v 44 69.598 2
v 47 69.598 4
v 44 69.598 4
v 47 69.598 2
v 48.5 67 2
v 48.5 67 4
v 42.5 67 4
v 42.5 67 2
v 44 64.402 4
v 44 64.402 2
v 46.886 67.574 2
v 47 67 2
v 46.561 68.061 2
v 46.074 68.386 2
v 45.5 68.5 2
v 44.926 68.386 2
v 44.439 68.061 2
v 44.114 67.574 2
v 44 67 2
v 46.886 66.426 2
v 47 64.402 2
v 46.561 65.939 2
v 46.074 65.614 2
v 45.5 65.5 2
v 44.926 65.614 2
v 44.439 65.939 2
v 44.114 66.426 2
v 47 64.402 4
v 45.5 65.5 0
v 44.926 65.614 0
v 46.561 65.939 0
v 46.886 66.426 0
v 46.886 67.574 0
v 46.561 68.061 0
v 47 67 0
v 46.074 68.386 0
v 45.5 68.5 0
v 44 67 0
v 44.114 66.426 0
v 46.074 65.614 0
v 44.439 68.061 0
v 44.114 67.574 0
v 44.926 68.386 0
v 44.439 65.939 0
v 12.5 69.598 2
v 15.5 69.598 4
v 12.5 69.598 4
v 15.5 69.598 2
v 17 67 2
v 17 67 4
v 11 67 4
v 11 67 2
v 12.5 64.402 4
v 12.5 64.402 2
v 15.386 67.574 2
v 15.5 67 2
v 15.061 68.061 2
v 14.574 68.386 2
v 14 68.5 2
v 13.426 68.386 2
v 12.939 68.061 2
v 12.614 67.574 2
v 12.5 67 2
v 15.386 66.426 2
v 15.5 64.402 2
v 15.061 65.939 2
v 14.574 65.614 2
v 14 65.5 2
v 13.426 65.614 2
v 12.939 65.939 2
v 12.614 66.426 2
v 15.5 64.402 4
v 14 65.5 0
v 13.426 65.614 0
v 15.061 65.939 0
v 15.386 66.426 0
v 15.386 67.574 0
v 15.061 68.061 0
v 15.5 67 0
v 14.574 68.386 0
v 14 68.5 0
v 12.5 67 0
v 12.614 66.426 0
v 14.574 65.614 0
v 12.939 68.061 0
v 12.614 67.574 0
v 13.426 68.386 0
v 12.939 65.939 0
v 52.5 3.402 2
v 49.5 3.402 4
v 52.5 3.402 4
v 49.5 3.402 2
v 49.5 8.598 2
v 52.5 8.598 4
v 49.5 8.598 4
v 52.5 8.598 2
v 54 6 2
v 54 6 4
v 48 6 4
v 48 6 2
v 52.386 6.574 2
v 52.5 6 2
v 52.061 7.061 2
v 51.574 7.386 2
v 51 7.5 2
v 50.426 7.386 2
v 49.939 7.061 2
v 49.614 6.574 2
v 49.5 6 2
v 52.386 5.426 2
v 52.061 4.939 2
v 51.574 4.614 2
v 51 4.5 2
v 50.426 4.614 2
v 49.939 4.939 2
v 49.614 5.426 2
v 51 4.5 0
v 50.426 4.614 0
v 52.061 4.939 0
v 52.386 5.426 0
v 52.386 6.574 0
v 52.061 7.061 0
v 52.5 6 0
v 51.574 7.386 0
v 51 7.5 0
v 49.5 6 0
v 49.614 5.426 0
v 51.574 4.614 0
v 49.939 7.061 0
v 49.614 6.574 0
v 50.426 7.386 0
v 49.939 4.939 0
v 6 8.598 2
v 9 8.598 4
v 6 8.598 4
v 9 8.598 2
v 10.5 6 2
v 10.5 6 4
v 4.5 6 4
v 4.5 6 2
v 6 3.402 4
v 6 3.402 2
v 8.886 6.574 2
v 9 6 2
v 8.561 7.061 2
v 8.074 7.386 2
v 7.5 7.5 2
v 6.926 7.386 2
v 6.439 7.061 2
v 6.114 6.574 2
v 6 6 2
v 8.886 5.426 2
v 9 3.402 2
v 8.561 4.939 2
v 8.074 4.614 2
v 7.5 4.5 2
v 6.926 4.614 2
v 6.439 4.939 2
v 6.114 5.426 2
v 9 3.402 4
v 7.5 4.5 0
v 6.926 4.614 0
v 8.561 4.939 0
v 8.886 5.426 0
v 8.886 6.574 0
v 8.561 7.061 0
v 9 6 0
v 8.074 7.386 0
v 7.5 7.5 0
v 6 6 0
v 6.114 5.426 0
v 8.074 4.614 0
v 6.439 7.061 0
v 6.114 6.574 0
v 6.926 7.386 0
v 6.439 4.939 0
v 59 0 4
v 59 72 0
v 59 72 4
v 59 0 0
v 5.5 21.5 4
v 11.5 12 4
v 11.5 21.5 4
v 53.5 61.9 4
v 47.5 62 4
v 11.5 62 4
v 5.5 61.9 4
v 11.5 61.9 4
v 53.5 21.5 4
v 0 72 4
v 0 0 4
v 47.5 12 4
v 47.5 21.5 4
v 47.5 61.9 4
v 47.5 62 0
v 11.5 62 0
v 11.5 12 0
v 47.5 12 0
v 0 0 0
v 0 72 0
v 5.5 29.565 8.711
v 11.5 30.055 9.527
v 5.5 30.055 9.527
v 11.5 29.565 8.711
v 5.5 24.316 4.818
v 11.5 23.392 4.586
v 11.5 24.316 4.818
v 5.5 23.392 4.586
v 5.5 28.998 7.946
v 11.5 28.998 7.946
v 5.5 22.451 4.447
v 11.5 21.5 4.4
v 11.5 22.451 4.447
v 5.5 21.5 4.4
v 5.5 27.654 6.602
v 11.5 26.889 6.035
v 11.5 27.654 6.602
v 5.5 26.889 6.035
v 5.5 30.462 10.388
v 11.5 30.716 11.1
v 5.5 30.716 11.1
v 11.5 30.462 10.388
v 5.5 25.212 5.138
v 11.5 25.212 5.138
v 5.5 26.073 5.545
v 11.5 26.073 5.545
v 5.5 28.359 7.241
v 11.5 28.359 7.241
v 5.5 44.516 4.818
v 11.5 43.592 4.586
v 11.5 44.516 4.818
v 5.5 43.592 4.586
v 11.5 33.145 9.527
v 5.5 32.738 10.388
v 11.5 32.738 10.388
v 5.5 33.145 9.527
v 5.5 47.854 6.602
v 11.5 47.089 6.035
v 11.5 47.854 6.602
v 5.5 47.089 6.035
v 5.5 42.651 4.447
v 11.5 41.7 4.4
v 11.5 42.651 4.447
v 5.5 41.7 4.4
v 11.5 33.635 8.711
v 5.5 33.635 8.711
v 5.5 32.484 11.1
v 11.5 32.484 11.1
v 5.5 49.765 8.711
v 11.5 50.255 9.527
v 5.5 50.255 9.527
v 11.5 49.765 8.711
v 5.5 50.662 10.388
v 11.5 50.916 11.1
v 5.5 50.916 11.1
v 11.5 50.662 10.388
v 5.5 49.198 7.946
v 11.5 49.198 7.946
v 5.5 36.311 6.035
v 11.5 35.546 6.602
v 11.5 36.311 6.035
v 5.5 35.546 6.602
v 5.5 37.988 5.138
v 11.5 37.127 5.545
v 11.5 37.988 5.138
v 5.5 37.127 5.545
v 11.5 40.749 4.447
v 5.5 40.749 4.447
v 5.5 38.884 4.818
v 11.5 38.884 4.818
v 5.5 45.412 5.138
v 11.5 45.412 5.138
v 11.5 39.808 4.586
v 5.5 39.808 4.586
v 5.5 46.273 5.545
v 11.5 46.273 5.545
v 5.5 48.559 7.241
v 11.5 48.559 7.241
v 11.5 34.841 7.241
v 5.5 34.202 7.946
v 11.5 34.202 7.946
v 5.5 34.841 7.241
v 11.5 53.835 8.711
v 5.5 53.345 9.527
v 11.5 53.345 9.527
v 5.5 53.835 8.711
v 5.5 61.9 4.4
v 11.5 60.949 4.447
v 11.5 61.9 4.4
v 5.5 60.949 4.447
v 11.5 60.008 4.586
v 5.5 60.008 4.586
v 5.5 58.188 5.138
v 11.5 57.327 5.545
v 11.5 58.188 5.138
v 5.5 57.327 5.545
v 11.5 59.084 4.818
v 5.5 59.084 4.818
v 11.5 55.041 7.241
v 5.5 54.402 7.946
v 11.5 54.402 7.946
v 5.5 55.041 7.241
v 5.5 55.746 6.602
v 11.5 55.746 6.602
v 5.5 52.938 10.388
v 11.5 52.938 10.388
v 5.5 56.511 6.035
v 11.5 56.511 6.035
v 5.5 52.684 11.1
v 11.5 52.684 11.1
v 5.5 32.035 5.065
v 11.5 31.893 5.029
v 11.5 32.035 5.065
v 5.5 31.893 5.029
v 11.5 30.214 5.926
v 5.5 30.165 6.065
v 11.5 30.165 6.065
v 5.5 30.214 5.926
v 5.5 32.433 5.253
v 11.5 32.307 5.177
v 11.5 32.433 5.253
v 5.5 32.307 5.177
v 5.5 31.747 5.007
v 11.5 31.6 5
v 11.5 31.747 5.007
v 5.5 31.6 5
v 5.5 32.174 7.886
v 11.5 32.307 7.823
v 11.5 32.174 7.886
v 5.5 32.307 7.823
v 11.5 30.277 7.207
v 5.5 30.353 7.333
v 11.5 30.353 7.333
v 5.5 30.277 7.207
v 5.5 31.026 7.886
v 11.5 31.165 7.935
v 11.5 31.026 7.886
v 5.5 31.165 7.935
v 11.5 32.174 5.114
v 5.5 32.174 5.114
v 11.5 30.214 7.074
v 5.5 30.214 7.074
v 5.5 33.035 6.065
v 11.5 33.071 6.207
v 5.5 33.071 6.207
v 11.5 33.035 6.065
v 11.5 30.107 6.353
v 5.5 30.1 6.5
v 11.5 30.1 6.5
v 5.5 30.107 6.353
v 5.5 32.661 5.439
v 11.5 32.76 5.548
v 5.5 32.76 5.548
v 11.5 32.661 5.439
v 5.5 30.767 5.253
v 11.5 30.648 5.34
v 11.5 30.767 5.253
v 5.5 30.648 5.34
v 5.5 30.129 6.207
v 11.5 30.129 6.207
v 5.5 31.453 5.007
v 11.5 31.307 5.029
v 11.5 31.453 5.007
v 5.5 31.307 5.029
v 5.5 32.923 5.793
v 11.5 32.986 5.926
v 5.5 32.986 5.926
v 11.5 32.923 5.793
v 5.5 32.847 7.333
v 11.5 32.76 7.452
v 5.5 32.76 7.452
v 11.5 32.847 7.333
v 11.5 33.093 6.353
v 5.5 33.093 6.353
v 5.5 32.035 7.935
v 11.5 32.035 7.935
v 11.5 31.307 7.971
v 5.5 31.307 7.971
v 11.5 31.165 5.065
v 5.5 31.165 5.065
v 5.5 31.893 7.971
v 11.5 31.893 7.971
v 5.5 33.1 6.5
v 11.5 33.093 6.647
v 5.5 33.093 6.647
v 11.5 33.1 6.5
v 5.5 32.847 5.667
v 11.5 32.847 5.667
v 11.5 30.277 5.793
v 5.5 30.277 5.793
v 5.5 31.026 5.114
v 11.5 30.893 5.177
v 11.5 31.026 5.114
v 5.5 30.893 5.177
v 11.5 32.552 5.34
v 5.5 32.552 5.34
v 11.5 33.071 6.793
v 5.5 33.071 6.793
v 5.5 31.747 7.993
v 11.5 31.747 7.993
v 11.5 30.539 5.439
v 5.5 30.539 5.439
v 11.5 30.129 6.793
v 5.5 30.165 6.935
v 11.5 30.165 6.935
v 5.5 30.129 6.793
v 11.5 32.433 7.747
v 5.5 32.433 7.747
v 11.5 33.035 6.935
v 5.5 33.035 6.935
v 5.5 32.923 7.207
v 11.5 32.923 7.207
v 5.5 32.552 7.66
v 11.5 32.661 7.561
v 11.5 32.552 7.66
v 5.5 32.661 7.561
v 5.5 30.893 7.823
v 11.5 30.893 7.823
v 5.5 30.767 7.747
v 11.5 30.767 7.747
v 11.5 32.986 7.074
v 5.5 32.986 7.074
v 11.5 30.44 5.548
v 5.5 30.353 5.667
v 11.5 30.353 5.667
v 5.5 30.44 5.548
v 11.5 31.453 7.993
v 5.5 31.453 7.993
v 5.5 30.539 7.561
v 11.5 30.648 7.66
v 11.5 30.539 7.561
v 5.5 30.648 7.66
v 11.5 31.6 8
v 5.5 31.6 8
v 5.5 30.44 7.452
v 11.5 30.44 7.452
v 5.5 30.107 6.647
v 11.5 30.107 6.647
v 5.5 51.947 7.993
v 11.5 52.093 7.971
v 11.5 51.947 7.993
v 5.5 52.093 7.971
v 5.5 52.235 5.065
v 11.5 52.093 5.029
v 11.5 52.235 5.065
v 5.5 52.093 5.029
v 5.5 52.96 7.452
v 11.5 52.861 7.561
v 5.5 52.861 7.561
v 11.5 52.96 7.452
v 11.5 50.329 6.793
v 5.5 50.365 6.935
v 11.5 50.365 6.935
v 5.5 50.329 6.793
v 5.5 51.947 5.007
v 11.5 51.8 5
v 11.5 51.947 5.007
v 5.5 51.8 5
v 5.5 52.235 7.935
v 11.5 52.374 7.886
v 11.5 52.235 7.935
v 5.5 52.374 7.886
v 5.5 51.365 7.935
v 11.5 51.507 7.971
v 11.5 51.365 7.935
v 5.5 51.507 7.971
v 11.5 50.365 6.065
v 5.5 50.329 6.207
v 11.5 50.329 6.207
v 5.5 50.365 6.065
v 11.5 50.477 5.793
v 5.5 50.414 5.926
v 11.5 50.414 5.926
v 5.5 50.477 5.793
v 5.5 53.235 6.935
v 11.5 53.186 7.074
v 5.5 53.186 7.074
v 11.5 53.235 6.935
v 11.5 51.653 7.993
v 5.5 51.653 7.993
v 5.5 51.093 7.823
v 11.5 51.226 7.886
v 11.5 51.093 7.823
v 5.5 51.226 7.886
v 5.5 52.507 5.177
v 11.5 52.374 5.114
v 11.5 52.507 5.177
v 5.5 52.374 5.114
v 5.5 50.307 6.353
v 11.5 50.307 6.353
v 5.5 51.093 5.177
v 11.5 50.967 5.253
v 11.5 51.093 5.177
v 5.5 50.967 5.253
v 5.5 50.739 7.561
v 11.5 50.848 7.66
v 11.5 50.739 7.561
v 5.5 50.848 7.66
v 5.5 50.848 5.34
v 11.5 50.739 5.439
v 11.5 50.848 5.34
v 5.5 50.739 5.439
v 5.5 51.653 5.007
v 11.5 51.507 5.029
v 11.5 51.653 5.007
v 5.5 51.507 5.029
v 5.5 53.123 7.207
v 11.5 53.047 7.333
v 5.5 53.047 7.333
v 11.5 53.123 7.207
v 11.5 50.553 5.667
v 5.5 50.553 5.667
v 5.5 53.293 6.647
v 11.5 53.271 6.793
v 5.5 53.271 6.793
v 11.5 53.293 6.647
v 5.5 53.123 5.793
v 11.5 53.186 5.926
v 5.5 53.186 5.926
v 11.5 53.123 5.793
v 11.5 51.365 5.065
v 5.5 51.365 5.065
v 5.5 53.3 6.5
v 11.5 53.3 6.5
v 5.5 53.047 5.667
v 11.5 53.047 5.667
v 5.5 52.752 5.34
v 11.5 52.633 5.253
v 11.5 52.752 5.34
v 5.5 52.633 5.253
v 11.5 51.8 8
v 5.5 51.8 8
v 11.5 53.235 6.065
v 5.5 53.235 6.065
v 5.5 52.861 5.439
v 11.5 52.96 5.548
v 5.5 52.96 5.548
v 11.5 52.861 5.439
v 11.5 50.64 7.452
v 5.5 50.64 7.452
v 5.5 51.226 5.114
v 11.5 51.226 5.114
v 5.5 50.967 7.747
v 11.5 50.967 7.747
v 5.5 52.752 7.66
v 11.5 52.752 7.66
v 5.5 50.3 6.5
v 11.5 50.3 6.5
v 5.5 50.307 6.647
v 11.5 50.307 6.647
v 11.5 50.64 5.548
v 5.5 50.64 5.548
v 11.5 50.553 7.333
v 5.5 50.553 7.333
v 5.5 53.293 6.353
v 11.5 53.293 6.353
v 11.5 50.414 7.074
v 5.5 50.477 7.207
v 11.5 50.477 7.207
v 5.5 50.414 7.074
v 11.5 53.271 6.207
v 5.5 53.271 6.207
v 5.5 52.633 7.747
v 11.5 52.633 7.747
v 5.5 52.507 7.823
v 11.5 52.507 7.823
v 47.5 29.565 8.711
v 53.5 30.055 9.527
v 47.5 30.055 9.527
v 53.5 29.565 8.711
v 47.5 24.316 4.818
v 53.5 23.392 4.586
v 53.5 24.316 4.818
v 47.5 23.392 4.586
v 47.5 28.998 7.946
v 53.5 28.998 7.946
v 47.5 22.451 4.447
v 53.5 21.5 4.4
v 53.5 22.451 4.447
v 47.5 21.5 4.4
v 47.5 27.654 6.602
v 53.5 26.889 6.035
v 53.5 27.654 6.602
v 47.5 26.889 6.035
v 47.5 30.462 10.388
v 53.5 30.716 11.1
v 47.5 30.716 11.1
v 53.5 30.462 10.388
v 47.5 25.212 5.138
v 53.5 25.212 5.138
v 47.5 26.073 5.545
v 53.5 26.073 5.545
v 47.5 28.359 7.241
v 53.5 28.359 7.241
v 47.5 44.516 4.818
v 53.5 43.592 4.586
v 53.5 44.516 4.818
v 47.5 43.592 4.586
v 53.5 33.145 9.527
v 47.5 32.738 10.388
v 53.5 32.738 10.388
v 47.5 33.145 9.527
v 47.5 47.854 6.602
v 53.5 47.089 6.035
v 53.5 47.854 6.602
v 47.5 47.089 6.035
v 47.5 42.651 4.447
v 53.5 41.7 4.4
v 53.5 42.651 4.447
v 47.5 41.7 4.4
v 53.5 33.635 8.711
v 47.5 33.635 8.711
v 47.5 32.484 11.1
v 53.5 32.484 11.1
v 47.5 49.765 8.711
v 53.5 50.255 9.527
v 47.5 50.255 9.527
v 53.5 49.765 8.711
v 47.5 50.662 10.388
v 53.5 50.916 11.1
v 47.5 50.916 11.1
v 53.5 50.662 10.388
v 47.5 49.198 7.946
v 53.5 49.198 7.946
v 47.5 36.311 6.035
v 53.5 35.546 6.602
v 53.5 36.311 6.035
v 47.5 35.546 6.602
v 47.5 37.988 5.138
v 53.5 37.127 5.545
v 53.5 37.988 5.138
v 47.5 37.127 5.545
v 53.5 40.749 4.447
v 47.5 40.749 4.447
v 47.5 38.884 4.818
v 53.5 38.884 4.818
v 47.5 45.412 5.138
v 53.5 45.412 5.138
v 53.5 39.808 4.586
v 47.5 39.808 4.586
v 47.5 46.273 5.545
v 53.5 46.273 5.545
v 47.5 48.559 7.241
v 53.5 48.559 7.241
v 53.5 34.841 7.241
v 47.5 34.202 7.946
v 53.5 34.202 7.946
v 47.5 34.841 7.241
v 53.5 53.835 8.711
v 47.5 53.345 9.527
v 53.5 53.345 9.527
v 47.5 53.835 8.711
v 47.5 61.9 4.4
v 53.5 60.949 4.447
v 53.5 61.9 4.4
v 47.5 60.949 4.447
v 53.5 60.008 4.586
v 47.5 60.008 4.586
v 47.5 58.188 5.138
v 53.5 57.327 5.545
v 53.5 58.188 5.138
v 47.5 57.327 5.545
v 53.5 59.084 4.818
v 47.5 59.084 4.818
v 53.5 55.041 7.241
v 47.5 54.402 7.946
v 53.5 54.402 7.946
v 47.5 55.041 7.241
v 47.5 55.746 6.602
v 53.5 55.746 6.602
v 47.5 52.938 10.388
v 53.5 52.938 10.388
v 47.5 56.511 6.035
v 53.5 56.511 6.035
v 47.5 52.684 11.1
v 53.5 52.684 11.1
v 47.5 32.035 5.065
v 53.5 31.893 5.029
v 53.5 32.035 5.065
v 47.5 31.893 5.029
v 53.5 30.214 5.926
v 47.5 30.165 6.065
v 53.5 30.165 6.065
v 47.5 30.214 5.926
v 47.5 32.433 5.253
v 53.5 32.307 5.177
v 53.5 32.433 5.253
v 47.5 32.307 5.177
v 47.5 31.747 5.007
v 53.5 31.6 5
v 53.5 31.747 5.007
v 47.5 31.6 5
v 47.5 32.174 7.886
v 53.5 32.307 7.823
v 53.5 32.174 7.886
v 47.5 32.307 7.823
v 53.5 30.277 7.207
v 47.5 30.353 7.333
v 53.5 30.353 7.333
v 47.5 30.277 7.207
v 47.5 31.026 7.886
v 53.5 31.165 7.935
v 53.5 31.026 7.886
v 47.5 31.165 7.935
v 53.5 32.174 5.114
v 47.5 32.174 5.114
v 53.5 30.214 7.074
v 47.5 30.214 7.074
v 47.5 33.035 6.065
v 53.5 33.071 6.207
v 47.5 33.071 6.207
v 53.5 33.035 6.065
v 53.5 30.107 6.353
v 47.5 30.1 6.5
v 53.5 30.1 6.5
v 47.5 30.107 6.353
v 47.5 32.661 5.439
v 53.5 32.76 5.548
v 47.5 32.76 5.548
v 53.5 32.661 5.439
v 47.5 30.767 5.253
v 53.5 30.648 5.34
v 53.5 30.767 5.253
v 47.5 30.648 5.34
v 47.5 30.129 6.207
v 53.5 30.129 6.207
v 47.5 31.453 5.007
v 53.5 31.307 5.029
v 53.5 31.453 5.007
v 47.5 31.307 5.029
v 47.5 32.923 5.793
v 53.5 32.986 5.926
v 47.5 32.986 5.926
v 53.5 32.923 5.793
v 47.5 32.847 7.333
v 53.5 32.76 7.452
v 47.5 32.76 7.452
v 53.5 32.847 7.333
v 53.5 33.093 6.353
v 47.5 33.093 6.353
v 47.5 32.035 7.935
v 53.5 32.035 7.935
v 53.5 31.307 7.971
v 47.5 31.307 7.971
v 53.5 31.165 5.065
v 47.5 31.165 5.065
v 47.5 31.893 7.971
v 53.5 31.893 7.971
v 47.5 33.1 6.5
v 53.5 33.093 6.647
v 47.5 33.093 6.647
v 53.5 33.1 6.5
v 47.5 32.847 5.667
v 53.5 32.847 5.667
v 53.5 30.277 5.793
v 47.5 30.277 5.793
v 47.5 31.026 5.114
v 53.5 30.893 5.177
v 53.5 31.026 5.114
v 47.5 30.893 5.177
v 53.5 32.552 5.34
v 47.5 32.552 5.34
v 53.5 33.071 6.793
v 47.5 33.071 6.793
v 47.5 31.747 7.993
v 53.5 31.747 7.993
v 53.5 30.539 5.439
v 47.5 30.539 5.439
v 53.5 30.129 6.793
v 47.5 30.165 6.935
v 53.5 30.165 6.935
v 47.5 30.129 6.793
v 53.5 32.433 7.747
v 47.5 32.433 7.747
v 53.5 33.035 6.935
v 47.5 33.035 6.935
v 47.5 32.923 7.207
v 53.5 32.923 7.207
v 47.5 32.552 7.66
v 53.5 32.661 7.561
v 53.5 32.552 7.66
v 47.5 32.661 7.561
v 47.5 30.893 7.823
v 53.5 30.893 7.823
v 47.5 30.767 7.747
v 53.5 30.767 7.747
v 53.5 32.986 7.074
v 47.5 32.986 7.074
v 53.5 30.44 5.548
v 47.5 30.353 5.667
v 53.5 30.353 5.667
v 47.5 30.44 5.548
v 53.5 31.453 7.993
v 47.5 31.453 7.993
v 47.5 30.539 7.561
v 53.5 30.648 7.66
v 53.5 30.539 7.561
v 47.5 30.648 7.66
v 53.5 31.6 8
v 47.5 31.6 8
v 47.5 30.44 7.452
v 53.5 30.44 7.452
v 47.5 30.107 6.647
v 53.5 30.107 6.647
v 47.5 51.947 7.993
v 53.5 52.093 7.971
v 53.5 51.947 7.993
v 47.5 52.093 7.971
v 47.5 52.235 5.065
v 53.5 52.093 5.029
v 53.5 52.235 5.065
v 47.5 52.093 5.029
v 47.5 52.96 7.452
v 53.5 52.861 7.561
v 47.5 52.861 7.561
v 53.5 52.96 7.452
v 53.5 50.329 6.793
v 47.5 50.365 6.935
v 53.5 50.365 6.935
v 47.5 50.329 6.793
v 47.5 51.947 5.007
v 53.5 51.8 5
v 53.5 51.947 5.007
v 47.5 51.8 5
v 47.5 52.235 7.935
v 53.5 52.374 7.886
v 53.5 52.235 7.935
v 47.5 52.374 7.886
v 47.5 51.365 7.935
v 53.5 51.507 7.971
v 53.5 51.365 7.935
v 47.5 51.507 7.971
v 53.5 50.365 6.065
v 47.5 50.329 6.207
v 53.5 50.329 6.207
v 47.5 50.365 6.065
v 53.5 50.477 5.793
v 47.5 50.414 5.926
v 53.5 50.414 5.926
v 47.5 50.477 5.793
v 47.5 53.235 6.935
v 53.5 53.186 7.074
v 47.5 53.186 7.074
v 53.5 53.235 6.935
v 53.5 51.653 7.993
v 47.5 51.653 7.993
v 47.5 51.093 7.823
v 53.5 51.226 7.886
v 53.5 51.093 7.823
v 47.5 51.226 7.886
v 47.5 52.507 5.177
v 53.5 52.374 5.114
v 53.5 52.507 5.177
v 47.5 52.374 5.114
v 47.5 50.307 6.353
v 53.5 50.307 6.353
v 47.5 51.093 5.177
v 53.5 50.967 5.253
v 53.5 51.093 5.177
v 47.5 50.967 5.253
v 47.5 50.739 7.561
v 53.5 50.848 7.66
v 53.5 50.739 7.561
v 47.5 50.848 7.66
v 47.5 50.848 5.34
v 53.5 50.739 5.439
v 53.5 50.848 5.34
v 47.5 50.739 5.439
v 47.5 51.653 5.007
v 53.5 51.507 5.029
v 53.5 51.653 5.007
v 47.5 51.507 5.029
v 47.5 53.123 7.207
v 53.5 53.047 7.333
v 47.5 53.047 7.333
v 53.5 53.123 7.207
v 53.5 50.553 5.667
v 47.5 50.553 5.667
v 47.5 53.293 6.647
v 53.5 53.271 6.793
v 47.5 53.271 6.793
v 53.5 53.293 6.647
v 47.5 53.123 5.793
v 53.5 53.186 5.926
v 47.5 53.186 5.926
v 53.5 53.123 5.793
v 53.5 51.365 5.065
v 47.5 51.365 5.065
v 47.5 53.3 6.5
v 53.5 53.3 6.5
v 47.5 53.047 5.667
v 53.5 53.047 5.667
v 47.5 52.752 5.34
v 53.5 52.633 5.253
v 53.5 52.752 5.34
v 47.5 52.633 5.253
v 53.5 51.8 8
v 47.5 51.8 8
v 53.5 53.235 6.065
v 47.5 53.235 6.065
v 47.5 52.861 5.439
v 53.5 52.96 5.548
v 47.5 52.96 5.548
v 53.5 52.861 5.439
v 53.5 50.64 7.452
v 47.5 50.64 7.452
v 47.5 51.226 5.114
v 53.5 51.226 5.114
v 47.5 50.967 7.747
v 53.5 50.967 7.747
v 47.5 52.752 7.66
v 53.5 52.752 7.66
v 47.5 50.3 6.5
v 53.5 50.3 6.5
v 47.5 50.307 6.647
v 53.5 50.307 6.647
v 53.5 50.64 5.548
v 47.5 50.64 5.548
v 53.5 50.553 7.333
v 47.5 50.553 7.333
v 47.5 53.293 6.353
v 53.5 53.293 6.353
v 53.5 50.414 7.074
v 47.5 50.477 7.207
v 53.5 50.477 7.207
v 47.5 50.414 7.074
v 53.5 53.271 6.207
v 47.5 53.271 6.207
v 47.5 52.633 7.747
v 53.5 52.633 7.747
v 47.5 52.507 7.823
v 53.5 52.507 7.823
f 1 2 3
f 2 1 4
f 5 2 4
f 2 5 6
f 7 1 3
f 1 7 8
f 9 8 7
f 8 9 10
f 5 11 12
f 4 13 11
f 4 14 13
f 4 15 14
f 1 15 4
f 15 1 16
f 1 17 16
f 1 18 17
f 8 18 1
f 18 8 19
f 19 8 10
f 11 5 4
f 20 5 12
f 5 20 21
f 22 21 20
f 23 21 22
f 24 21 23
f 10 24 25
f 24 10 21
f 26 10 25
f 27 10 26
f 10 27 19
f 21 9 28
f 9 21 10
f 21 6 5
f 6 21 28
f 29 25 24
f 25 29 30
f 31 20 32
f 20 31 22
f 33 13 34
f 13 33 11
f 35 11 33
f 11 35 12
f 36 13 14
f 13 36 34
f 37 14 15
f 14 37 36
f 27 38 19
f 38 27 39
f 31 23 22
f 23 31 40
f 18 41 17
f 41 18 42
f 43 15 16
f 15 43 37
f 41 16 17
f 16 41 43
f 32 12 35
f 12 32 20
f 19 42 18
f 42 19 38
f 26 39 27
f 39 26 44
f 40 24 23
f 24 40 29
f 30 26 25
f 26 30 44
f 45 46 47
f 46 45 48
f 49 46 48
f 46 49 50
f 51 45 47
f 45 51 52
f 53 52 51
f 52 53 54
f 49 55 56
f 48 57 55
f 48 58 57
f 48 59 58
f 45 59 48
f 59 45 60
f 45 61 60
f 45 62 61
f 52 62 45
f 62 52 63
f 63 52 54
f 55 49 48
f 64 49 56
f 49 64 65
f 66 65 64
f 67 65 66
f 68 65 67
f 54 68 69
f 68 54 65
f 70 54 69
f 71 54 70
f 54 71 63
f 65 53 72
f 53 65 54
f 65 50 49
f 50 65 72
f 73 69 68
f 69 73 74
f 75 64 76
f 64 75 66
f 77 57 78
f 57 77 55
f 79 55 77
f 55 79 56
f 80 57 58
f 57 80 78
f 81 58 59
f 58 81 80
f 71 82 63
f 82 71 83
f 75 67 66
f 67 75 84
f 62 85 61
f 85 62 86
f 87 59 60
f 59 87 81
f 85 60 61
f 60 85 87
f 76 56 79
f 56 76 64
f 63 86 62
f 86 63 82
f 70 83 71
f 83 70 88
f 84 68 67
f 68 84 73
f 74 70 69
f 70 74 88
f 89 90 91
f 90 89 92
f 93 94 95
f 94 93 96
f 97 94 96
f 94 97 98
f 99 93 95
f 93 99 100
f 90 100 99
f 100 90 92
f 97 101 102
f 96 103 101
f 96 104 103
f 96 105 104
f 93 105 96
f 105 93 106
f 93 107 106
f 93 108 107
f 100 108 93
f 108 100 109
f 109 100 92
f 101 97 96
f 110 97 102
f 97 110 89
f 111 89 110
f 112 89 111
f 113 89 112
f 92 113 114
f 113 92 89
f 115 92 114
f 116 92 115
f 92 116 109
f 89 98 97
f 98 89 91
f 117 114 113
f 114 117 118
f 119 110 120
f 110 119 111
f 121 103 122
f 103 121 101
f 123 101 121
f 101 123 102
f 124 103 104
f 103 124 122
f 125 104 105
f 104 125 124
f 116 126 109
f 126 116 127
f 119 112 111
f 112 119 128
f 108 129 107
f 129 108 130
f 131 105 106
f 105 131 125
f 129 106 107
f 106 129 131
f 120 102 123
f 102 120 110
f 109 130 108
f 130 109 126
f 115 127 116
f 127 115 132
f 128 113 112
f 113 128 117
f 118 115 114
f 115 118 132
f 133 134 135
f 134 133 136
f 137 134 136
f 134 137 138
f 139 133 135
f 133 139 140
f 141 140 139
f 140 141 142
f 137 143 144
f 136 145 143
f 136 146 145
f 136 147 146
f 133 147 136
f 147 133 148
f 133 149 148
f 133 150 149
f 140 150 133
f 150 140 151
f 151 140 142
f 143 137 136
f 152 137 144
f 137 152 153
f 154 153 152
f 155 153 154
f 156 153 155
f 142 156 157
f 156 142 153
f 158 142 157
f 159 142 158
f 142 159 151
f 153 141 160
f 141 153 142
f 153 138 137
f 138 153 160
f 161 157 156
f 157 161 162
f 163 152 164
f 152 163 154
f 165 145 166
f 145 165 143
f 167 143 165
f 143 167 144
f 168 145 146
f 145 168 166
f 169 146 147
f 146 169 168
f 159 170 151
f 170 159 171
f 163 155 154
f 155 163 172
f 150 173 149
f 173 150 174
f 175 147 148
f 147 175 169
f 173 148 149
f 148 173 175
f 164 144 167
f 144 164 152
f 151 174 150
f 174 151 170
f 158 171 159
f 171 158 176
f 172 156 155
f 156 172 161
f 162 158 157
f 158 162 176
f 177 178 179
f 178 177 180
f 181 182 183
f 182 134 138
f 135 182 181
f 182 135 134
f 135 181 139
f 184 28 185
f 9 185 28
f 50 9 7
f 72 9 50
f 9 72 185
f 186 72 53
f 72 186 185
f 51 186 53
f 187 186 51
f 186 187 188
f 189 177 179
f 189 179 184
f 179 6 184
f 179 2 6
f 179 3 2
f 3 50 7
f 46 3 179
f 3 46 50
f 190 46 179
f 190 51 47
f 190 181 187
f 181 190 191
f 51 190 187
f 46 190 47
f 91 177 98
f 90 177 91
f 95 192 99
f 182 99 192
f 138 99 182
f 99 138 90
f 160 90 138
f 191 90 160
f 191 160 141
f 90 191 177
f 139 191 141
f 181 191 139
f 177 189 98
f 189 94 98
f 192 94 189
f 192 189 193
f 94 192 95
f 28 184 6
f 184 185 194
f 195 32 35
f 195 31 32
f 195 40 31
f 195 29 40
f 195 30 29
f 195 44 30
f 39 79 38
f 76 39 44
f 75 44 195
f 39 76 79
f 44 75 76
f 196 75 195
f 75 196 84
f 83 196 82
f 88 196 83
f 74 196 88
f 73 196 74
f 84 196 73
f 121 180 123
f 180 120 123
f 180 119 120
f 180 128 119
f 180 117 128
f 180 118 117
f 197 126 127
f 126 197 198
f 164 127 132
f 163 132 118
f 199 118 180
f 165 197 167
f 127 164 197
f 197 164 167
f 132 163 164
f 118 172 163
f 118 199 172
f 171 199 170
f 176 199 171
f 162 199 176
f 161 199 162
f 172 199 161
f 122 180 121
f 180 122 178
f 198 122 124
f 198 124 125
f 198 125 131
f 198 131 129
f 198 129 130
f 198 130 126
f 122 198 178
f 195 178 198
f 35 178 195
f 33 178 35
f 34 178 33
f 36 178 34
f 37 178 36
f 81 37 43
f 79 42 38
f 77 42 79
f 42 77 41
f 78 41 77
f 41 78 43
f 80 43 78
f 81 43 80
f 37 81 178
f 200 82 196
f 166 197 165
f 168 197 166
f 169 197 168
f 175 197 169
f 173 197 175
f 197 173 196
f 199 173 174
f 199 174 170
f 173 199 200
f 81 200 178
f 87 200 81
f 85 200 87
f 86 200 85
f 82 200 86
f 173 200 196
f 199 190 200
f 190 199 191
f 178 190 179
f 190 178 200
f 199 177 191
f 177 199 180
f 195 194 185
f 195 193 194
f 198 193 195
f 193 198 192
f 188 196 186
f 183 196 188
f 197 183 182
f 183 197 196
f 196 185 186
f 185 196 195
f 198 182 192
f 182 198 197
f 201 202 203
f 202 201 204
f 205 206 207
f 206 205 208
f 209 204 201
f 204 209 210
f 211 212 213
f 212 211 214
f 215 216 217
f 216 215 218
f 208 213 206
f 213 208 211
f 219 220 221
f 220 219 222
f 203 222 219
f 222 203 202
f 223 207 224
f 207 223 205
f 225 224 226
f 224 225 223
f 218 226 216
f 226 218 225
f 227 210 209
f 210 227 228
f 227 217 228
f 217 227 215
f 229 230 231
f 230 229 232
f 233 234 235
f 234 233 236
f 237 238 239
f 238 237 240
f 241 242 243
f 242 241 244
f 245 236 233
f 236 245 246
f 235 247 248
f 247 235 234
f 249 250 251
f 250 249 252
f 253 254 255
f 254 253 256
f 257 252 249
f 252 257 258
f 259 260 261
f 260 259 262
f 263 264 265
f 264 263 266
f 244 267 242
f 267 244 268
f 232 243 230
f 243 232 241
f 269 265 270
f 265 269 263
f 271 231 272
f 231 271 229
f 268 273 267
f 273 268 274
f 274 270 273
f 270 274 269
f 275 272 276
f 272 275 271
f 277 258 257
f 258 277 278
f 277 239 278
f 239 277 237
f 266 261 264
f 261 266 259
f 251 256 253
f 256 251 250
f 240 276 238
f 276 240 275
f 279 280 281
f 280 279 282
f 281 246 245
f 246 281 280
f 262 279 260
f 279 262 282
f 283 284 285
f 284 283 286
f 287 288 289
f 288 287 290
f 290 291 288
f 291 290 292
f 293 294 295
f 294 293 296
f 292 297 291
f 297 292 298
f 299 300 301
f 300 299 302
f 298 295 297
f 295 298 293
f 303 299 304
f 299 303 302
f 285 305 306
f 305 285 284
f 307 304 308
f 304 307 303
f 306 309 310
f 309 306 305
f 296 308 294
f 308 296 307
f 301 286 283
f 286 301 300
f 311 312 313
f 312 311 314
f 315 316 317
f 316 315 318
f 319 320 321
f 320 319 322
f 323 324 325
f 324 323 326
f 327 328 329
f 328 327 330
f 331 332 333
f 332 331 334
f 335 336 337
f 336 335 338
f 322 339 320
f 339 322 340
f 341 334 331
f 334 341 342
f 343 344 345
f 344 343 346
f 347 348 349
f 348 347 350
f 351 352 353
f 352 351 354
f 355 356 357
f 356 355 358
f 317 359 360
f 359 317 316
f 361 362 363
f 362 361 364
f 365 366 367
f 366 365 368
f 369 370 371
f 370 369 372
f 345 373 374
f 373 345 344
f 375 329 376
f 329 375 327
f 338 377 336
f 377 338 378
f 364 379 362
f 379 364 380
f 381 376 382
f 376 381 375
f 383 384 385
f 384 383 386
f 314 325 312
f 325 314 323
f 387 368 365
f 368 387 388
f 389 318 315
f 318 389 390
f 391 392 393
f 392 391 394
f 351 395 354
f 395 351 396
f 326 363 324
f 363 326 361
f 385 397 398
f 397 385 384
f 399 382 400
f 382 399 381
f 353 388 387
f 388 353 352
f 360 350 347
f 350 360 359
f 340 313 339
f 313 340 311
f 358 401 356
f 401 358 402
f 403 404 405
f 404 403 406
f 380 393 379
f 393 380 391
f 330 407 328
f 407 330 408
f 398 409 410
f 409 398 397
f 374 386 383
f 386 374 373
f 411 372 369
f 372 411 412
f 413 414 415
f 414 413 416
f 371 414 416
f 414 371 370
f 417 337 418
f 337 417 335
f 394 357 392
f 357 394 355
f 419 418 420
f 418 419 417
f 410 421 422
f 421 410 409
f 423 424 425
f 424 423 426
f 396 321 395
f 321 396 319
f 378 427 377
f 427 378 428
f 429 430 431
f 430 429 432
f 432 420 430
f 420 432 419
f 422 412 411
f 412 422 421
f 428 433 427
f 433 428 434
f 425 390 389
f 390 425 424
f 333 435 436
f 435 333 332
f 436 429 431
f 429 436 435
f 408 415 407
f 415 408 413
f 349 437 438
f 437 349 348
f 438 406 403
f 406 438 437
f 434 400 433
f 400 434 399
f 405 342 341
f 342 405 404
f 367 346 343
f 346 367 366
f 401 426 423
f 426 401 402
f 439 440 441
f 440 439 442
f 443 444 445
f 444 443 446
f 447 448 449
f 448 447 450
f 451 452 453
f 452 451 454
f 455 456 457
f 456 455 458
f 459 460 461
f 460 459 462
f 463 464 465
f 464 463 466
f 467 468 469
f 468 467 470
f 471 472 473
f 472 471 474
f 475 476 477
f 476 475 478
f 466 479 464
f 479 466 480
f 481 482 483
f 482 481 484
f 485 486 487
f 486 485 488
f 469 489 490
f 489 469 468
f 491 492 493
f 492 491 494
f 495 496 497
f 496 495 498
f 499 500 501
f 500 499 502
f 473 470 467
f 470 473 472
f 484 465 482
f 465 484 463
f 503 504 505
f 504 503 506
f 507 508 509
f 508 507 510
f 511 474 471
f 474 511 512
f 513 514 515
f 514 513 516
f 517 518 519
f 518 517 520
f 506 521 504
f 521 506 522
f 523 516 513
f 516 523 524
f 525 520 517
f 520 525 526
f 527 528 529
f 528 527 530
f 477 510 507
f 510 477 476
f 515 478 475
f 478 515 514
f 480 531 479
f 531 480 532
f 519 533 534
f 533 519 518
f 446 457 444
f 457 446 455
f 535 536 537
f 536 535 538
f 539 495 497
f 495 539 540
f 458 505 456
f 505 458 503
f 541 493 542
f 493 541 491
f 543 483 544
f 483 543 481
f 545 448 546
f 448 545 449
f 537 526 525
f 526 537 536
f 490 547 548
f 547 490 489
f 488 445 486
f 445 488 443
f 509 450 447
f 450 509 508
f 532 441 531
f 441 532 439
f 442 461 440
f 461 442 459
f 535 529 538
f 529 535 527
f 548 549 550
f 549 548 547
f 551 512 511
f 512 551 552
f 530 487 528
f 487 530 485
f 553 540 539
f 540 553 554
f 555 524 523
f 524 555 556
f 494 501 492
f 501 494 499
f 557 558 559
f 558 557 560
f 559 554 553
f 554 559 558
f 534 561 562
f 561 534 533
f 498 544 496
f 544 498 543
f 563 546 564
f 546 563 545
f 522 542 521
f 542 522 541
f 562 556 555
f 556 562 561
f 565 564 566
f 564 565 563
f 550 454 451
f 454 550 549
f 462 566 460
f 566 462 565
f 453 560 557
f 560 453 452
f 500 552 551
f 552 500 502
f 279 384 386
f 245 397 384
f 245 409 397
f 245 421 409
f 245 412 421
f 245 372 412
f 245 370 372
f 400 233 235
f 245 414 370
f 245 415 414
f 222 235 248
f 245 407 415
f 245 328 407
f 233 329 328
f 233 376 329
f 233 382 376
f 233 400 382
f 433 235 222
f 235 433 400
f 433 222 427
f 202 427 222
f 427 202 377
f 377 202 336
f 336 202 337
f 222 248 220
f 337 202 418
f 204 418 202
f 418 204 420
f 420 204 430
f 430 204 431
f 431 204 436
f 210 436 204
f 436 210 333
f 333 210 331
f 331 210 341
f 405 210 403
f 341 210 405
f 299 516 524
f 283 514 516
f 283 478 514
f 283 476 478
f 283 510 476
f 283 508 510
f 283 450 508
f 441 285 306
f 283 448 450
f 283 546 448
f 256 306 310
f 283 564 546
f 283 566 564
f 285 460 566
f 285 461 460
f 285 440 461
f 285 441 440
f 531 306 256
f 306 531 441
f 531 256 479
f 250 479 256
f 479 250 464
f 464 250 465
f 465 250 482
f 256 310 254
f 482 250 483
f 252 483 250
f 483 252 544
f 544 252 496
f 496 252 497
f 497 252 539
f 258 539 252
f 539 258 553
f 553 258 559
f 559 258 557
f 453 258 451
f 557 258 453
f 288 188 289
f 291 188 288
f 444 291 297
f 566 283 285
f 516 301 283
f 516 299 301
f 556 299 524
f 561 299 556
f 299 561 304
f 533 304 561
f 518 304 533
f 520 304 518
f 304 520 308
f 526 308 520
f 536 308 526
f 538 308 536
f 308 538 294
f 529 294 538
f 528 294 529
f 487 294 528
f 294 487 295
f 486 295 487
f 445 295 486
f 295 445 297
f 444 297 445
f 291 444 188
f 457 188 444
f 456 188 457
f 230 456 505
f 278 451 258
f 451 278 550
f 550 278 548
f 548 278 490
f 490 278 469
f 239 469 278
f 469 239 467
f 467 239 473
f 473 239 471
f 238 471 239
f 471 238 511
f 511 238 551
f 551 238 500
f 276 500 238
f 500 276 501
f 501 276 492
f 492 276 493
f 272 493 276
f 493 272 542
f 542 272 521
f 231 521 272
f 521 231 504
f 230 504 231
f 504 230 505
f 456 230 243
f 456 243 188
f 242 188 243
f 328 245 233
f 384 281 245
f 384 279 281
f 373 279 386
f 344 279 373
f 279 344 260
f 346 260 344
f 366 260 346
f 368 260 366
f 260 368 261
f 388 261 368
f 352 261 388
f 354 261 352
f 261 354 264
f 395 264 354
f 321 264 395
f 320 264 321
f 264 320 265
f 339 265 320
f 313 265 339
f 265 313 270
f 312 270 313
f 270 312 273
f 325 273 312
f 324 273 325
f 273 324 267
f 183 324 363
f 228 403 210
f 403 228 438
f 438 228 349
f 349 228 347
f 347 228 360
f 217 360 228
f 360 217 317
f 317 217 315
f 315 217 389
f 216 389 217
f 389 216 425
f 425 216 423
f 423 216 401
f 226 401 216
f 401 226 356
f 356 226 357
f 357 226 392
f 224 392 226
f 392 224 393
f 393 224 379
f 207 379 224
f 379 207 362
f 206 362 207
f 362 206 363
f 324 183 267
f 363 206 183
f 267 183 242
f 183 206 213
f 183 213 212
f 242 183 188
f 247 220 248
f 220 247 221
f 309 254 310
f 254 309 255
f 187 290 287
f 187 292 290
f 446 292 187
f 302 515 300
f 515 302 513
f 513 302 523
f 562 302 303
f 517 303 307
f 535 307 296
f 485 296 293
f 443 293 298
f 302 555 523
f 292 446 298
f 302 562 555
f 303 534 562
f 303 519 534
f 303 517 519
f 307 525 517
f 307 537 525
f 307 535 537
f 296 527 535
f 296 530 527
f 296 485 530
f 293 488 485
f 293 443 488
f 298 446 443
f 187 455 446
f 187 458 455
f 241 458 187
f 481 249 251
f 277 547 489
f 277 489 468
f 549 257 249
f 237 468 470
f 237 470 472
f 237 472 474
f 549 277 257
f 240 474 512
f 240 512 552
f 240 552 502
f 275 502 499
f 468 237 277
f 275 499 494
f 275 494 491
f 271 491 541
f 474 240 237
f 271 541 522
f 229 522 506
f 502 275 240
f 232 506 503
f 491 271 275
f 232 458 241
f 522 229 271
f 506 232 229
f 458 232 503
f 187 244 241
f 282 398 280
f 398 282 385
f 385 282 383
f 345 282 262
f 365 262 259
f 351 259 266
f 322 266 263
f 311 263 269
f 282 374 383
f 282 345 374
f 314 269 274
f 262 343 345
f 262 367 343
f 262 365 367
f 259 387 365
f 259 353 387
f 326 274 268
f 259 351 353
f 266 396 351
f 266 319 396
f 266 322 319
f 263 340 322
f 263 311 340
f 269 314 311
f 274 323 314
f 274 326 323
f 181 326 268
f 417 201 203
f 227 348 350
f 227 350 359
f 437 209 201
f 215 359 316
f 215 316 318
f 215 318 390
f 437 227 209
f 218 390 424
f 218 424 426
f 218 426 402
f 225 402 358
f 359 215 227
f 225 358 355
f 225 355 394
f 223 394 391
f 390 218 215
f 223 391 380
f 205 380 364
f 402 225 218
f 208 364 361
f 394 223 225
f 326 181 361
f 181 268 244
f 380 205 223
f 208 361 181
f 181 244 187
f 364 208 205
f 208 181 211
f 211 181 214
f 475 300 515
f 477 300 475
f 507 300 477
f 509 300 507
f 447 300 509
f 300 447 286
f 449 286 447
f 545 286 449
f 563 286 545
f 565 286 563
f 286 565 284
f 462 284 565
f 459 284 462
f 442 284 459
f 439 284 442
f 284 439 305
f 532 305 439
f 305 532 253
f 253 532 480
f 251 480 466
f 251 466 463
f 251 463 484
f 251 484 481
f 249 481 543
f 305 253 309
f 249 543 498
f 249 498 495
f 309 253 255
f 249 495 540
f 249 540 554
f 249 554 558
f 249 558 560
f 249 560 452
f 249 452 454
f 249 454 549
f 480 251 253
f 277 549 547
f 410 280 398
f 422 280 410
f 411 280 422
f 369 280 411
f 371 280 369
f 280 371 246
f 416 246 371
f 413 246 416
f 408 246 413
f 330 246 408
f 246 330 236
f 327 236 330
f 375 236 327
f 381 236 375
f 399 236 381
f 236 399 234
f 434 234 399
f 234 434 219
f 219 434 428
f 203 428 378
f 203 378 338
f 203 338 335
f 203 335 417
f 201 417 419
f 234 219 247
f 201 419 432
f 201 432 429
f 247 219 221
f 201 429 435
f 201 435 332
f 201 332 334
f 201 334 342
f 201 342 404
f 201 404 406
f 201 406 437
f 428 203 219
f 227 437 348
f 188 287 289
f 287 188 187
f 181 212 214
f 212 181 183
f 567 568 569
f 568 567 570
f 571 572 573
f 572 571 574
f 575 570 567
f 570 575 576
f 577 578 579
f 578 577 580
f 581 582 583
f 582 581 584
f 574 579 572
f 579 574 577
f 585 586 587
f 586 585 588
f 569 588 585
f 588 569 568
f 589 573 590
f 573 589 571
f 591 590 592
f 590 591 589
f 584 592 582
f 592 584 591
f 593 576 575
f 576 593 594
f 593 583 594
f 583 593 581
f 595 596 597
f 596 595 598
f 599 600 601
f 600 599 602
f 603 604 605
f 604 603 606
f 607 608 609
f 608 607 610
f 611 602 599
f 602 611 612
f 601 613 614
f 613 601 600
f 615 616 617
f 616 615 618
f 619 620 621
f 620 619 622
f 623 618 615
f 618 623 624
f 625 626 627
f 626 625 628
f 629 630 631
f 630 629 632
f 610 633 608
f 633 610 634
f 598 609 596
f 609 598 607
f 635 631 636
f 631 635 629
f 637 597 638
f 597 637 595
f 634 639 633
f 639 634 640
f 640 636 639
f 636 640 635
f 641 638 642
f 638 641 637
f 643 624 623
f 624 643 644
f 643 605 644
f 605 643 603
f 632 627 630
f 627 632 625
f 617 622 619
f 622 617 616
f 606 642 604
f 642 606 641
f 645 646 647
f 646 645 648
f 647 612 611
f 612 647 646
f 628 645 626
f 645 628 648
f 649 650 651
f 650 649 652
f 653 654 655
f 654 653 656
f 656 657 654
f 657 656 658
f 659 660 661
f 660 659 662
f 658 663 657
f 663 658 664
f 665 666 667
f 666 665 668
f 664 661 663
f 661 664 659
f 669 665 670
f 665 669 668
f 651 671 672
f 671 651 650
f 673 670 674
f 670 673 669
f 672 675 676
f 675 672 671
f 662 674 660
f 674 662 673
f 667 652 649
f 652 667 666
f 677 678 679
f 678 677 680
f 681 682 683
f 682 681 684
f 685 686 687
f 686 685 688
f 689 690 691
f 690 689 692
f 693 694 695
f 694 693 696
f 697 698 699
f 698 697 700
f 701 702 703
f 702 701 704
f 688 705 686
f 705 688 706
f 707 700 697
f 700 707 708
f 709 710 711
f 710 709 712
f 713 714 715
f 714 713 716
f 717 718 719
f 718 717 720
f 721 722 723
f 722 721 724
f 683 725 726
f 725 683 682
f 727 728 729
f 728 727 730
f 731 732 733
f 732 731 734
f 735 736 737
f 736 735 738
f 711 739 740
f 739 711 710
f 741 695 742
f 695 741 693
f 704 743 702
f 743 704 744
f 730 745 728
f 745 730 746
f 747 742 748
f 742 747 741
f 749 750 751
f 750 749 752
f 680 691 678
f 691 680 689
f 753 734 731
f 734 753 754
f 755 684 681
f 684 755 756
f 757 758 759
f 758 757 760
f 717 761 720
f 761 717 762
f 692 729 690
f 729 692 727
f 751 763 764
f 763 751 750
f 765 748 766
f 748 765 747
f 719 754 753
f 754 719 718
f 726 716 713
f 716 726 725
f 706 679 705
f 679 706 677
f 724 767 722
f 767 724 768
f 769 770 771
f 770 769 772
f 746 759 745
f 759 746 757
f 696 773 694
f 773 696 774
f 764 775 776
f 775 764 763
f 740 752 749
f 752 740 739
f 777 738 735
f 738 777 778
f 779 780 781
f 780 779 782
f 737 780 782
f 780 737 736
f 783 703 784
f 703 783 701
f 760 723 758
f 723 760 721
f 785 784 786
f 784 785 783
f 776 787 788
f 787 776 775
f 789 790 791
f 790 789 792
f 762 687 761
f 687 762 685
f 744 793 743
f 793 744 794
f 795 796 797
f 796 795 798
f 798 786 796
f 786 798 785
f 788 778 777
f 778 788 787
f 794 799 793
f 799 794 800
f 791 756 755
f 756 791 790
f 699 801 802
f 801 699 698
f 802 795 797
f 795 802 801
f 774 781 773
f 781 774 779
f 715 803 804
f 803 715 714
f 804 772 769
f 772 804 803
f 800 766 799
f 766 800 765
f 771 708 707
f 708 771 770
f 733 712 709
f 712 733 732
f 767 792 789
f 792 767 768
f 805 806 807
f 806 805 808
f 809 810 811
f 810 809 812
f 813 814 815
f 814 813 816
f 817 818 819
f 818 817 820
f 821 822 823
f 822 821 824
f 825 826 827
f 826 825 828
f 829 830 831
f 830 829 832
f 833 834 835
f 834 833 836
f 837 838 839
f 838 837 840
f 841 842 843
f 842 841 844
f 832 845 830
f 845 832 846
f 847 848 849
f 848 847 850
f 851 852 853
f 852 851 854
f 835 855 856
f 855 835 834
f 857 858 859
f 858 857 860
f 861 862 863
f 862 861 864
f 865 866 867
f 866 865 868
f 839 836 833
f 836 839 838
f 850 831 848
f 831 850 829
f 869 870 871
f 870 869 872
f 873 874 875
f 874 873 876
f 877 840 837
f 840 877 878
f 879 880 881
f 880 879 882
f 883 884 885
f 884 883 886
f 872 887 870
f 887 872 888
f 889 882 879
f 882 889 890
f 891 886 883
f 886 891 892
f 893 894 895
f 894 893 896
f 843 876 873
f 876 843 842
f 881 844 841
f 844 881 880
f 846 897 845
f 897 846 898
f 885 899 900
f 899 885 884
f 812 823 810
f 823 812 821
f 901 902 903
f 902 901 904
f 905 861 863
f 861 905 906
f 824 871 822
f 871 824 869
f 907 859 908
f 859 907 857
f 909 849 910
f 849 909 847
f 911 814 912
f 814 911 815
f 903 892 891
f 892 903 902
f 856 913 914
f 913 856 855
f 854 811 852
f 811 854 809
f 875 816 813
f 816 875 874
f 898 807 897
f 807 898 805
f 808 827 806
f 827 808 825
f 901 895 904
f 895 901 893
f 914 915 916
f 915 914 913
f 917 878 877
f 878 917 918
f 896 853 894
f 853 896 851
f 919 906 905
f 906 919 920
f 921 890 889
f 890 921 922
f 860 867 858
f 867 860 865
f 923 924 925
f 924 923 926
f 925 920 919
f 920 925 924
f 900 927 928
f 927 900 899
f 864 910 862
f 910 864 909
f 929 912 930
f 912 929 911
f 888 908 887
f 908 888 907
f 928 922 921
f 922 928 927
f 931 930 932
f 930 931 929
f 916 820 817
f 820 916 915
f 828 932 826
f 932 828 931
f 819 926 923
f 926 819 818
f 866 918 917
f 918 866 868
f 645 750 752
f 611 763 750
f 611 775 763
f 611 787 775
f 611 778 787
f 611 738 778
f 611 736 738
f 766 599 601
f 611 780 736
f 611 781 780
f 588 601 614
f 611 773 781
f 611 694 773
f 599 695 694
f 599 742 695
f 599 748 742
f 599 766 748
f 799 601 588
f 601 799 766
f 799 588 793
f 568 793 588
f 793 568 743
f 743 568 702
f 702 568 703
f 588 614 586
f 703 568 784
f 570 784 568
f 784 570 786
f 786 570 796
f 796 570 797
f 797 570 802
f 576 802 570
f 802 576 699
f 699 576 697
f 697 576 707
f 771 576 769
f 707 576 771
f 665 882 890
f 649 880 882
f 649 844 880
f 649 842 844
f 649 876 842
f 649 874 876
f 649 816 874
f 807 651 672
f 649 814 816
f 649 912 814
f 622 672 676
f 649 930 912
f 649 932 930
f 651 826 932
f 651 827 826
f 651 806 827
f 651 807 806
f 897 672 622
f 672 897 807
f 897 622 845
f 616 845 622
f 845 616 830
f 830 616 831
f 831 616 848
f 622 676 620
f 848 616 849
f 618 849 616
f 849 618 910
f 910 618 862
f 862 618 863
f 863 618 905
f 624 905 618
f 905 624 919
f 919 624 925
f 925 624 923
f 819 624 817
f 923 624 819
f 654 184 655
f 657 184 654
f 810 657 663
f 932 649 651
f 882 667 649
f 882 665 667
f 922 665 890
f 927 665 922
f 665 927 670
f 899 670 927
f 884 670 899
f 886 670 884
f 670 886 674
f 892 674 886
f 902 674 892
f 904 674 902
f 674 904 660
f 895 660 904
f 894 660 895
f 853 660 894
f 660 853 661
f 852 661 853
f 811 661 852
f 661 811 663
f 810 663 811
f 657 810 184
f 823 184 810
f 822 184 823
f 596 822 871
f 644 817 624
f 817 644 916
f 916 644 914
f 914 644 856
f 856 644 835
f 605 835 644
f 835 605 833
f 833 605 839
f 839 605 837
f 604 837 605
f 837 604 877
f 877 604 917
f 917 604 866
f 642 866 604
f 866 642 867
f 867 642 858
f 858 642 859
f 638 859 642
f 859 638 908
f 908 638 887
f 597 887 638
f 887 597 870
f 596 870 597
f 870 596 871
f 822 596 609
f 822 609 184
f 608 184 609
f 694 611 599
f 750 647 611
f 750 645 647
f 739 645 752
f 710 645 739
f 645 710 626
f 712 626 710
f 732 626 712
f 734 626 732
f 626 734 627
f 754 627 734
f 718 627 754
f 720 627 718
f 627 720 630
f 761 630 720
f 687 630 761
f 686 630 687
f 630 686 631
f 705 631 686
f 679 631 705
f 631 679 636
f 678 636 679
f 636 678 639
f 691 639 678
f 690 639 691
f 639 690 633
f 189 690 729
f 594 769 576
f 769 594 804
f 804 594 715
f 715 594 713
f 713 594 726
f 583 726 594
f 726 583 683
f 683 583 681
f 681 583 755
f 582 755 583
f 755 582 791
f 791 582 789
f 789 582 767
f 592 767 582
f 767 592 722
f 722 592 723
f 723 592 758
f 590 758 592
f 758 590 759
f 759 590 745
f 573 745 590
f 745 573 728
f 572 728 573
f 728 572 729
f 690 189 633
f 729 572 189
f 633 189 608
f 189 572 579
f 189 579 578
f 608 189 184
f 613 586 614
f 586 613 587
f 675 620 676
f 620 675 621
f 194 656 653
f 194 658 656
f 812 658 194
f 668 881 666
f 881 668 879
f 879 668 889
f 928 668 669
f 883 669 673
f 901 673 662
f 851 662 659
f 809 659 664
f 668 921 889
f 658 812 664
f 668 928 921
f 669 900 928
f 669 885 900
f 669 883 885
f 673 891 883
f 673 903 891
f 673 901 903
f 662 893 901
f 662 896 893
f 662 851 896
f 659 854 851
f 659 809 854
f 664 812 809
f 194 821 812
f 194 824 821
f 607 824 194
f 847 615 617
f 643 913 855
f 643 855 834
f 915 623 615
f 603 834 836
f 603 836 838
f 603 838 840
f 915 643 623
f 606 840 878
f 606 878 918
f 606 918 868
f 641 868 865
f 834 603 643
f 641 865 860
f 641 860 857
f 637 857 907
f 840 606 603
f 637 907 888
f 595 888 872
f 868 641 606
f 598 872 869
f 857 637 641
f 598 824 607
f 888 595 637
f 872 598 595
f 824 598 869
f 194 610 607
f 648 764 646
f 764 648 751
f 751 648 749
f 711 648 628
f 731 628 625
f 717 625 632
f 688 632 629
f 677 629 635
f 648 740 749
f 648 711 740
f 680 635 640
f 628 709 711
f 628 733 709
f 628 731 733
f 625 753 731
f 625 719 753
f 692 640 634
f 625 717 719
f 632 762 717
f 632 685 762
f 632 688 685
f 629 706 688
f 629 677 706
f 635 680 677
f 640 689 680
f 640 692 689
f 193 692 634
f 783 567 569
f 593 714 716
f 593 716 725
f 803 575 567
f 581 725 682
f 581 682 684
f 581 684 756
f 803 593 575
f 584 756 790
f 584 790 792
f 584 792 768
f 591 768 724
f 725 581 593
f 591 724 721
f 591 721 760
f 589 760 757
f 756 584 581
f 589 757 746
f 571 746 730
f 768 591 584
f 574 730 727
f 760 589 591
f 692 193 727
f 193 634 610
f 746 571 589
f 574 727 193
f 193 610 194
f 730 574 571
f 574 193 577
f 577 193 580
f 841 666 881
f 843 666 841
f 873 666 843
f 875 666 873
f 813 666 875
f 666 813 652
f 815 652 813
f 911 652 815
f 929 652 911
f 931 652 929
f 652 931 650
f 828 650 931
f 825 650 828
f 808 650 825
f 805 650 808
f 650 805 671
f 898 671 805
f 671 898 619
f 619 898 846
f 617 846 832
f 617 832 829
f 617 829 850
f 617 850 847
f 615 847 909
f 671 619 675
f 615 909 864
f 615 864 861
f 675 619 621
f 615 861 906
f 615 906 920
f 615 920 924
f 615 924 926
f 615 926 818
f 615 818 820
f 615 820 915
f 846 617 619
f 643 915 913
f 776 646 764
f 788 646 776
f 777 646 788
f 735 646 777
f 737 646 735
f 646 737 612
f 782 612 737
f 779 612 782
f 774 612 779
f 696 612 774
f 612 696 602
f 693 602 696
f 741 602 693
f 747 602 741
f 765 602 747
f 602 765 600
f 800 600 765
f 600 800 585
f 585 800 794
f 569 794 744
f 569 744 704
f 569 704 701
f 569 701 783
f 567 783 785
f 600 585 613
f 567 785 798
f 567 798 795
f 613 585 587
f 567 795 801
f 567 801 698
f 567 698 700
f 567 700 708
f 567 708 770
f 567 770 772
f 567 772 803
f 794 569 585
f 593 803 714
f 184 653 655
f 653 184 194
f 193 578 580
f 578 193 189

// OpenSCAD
bmsLength=51;
bmsWidth=70;

lengthOffset=4;
widthOffset=2;

baseLength=bmsLength+2*lengthOffset;//64
baseWidth=bmsWidth+widthOffset;
baseHeight=4;

leftTopScrewOffsetX=9.5+lengthOffset;
rightTopScrewOffsetX=10+lengthOffset;
leftBottomScrewOffsetX=4+lengthOffset;
rightBottomScrewOffsetX=3.5+lengthOffset;

topScrewsOffsetY=3;
bottomScrewsOffsetY=6;

innerSpaceX=48;
batteryOffset=20.2;
batteryHolderWidth=6;

bottomHolderWidth=12;
topHolderWidth=10;
sideHolderWidth=(baseLength-innerSpaceX)/2+batteryHolderWidth;


module nutHoles()
{
	x1=baseLength-leftTopScrewOffsetX;
	x2=rightTopScrewOffsetX;
	x3=baseLength-leftBottomScrewOffsetX;
	x4=rightBottomScrewOffsetX;
	
	y1=baseWidth-widthOffset-topScrewsOffsetY;
	y2=bottomScrewsOffsetY;
	
	for(t=[[x1,y1],[x2,y1],[x3,y2],[x4,y2]])
	{
		translate([t[0],t[1],baseHeight-2])
		cylinder(h=baseHeight,d=6,$fn=6);
		
		translate([t[0],t[1],-1])
		cylinder(h=baseHeight+2,d=3,$fn=16);
	}
}

module holders()
{
	x1=(baseLength-innerSpaceX)/2;
	x2=(baseLength+innerSpaceX)/2-batteryHolderWidth;
	for(t=[x1,x2])
	{
		boHalf=batteryOffset/2;
		w=2*batteryOffset;
		union()
		{
			translate([t,baseWidth-batteryOffset/2-w,baseHeight])
			
			difference()
			{
				cube([batteryHolderWidth,w,batteryOffset/2-3]);
				
				for(q=[0,1,2])
				{
					translate([-1,q*batteryOffset,boHalf])
					rotate([0,90,0])
					cylinder(h=batteryHolderWidth+2,d=19.4,$fn=64);
				}
				
				for(q=[1,3])
				{
					translate([-1,q*boHalf,2.5])
					rotate([0,90,0])
					cylinder(h=batteryHolderWidth+2,d=3,$fn=64);
				}
			}
		}
	}
}

union()
{
	difference()
	{
		cube([baseLength,baseWidth,baseHeight]);
		
		translate([sideHolderWidth,bottomHolderWidth,-1])
		cube([baseLength-2*sideHolderWidth,baseWidth-bottomHolderWidth-topHolderWidth,baseHeight+2]);
		
		nutHoles();
	}
	
	holders();
}
